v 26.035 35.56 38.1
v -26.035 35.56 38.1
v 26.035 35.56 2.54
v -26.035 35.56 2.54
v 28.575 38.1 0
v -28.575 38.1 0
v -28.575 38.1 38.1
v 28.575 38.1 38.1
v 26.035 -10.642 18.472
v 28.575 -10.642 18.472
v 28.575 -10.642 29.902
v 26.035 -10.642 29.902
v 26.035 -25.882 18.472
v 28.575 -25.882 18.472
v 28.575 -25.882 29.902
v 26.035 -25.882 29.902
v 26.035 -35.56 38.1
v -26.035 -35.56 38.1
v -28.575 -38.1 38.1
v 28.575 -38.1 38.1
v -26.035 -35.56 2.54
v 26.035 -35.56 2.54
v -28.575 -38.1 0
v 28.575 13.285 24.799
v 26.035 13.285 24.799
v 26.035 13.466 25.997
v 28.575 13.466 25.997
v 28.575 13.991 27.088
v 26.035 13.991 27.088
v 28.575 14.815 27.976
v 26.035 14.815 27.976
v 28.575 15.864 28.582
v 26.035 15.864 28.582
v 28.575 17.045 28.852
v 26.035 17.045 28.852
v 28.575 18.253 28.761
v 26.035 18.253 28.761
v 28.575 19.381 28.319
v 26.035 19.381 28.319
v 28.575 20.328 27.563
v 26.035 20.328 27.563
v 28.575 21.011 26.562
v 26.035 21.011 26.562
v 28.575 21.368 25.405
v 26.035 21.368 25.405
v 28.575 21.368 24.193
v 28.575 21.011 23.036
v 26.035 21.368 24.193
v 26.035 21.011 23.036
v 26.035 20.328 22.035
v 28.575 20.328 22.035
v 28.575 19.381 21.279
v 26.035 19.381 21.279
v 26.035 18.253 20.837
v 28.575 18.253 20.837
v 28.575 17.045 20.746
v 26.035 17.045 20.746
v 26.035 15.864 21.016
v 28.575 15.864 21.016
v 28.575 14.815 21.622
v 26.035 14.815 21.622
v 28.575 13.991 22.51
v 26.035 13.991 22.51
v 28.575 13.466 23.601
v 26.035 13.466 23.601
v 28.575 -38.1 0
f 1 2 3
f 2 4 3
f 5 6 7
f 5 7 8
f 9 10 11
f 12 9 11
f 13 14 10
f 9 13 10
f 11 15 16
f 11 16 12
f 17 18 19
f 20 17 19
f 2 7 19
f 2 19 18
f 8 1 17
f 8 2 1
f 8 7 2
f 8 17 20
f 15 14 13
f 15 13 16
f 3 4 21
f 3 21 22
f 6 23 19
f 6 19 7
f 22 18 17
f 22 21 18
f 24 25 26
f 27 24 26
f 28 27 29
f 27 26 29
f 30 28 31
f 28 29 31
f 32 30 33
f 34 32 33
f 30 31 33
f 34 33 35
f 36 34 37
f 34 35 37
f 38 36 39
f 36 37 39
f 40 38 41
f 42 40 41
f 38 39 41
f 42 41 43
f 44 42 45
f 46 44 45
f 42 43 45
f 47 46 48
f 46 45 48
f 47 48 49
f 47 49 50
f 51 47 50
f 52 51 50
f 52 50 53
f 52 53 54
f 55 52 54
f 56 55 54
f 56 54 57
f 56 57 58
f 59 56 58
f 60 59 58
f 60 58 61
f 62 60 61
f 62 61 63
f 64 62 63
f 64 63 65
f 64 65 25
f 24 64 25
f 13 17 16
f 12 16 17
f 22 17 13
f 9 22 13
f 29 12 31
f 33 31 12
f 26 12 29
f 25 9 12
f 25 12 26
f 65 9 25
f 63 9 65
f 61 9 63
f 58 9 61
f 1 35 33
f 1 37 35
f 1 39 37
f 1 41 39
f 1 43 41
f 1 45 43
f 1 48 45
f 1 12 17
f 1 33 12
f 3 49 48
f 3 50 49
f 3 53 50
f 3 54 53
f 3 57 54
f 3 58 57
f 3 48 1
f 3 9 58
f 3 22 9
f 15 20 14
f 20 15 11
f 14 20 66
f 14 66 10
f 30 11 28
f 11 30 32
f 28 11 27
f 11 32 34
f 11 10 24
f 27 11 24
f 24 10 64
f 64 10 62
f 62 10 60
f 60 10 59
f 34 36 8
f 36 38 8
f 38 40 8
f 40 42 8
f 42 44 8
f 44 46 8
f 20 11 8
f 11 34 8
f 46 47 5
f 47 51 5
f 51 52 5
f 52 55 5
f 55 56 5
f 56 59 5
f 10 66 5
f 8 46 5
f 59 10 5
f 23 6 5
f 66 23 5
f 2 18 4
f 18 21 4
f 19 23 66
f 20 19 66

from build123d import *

# Parameters (mm, degrees)
F0_W     = 57.15
F0_H     = 76.2
F1_DEPTH = 38.1
F2_T     = -2.54
F3_W     = 15.24
F3_H     = 11.43
F4_DEPTH = 25.4
F6_D     = 8.128
F6_DEPTH = 12.7


with BuildPart() as f1:
    # F0 (on Top) → F1 (new body)
    with BuildSketch(Plane.XY):
        Rectangle(F0_W, F0_H)
    extrude(amount=F1_DEPTH)

    # F2
    f2_openings = [f1.faces().sort_by_distance(p)[0] for p in [
        (0, 0, 38.1),
    ]]
    offset(amount=F2_T, openings=f2_openings)

    # F3 (on face) → F4 (cut)
    with BuildSketch(Plane.YZ.offset(28.575)):
        with Locations((-18.261918, 24.186697)):
            Rectangle(F3_W, F3_H)
    extrude(amount=-F4_DEPTH, mode=Mode.SUBTRACT)

    # F6
    with Locations(Plane.YZ.offset(28.575)):
        with Locations((17.349107, 24.799019)):
            Hole(F6_D / 2, depth=F6_DEPTH)


solid = f1.part
